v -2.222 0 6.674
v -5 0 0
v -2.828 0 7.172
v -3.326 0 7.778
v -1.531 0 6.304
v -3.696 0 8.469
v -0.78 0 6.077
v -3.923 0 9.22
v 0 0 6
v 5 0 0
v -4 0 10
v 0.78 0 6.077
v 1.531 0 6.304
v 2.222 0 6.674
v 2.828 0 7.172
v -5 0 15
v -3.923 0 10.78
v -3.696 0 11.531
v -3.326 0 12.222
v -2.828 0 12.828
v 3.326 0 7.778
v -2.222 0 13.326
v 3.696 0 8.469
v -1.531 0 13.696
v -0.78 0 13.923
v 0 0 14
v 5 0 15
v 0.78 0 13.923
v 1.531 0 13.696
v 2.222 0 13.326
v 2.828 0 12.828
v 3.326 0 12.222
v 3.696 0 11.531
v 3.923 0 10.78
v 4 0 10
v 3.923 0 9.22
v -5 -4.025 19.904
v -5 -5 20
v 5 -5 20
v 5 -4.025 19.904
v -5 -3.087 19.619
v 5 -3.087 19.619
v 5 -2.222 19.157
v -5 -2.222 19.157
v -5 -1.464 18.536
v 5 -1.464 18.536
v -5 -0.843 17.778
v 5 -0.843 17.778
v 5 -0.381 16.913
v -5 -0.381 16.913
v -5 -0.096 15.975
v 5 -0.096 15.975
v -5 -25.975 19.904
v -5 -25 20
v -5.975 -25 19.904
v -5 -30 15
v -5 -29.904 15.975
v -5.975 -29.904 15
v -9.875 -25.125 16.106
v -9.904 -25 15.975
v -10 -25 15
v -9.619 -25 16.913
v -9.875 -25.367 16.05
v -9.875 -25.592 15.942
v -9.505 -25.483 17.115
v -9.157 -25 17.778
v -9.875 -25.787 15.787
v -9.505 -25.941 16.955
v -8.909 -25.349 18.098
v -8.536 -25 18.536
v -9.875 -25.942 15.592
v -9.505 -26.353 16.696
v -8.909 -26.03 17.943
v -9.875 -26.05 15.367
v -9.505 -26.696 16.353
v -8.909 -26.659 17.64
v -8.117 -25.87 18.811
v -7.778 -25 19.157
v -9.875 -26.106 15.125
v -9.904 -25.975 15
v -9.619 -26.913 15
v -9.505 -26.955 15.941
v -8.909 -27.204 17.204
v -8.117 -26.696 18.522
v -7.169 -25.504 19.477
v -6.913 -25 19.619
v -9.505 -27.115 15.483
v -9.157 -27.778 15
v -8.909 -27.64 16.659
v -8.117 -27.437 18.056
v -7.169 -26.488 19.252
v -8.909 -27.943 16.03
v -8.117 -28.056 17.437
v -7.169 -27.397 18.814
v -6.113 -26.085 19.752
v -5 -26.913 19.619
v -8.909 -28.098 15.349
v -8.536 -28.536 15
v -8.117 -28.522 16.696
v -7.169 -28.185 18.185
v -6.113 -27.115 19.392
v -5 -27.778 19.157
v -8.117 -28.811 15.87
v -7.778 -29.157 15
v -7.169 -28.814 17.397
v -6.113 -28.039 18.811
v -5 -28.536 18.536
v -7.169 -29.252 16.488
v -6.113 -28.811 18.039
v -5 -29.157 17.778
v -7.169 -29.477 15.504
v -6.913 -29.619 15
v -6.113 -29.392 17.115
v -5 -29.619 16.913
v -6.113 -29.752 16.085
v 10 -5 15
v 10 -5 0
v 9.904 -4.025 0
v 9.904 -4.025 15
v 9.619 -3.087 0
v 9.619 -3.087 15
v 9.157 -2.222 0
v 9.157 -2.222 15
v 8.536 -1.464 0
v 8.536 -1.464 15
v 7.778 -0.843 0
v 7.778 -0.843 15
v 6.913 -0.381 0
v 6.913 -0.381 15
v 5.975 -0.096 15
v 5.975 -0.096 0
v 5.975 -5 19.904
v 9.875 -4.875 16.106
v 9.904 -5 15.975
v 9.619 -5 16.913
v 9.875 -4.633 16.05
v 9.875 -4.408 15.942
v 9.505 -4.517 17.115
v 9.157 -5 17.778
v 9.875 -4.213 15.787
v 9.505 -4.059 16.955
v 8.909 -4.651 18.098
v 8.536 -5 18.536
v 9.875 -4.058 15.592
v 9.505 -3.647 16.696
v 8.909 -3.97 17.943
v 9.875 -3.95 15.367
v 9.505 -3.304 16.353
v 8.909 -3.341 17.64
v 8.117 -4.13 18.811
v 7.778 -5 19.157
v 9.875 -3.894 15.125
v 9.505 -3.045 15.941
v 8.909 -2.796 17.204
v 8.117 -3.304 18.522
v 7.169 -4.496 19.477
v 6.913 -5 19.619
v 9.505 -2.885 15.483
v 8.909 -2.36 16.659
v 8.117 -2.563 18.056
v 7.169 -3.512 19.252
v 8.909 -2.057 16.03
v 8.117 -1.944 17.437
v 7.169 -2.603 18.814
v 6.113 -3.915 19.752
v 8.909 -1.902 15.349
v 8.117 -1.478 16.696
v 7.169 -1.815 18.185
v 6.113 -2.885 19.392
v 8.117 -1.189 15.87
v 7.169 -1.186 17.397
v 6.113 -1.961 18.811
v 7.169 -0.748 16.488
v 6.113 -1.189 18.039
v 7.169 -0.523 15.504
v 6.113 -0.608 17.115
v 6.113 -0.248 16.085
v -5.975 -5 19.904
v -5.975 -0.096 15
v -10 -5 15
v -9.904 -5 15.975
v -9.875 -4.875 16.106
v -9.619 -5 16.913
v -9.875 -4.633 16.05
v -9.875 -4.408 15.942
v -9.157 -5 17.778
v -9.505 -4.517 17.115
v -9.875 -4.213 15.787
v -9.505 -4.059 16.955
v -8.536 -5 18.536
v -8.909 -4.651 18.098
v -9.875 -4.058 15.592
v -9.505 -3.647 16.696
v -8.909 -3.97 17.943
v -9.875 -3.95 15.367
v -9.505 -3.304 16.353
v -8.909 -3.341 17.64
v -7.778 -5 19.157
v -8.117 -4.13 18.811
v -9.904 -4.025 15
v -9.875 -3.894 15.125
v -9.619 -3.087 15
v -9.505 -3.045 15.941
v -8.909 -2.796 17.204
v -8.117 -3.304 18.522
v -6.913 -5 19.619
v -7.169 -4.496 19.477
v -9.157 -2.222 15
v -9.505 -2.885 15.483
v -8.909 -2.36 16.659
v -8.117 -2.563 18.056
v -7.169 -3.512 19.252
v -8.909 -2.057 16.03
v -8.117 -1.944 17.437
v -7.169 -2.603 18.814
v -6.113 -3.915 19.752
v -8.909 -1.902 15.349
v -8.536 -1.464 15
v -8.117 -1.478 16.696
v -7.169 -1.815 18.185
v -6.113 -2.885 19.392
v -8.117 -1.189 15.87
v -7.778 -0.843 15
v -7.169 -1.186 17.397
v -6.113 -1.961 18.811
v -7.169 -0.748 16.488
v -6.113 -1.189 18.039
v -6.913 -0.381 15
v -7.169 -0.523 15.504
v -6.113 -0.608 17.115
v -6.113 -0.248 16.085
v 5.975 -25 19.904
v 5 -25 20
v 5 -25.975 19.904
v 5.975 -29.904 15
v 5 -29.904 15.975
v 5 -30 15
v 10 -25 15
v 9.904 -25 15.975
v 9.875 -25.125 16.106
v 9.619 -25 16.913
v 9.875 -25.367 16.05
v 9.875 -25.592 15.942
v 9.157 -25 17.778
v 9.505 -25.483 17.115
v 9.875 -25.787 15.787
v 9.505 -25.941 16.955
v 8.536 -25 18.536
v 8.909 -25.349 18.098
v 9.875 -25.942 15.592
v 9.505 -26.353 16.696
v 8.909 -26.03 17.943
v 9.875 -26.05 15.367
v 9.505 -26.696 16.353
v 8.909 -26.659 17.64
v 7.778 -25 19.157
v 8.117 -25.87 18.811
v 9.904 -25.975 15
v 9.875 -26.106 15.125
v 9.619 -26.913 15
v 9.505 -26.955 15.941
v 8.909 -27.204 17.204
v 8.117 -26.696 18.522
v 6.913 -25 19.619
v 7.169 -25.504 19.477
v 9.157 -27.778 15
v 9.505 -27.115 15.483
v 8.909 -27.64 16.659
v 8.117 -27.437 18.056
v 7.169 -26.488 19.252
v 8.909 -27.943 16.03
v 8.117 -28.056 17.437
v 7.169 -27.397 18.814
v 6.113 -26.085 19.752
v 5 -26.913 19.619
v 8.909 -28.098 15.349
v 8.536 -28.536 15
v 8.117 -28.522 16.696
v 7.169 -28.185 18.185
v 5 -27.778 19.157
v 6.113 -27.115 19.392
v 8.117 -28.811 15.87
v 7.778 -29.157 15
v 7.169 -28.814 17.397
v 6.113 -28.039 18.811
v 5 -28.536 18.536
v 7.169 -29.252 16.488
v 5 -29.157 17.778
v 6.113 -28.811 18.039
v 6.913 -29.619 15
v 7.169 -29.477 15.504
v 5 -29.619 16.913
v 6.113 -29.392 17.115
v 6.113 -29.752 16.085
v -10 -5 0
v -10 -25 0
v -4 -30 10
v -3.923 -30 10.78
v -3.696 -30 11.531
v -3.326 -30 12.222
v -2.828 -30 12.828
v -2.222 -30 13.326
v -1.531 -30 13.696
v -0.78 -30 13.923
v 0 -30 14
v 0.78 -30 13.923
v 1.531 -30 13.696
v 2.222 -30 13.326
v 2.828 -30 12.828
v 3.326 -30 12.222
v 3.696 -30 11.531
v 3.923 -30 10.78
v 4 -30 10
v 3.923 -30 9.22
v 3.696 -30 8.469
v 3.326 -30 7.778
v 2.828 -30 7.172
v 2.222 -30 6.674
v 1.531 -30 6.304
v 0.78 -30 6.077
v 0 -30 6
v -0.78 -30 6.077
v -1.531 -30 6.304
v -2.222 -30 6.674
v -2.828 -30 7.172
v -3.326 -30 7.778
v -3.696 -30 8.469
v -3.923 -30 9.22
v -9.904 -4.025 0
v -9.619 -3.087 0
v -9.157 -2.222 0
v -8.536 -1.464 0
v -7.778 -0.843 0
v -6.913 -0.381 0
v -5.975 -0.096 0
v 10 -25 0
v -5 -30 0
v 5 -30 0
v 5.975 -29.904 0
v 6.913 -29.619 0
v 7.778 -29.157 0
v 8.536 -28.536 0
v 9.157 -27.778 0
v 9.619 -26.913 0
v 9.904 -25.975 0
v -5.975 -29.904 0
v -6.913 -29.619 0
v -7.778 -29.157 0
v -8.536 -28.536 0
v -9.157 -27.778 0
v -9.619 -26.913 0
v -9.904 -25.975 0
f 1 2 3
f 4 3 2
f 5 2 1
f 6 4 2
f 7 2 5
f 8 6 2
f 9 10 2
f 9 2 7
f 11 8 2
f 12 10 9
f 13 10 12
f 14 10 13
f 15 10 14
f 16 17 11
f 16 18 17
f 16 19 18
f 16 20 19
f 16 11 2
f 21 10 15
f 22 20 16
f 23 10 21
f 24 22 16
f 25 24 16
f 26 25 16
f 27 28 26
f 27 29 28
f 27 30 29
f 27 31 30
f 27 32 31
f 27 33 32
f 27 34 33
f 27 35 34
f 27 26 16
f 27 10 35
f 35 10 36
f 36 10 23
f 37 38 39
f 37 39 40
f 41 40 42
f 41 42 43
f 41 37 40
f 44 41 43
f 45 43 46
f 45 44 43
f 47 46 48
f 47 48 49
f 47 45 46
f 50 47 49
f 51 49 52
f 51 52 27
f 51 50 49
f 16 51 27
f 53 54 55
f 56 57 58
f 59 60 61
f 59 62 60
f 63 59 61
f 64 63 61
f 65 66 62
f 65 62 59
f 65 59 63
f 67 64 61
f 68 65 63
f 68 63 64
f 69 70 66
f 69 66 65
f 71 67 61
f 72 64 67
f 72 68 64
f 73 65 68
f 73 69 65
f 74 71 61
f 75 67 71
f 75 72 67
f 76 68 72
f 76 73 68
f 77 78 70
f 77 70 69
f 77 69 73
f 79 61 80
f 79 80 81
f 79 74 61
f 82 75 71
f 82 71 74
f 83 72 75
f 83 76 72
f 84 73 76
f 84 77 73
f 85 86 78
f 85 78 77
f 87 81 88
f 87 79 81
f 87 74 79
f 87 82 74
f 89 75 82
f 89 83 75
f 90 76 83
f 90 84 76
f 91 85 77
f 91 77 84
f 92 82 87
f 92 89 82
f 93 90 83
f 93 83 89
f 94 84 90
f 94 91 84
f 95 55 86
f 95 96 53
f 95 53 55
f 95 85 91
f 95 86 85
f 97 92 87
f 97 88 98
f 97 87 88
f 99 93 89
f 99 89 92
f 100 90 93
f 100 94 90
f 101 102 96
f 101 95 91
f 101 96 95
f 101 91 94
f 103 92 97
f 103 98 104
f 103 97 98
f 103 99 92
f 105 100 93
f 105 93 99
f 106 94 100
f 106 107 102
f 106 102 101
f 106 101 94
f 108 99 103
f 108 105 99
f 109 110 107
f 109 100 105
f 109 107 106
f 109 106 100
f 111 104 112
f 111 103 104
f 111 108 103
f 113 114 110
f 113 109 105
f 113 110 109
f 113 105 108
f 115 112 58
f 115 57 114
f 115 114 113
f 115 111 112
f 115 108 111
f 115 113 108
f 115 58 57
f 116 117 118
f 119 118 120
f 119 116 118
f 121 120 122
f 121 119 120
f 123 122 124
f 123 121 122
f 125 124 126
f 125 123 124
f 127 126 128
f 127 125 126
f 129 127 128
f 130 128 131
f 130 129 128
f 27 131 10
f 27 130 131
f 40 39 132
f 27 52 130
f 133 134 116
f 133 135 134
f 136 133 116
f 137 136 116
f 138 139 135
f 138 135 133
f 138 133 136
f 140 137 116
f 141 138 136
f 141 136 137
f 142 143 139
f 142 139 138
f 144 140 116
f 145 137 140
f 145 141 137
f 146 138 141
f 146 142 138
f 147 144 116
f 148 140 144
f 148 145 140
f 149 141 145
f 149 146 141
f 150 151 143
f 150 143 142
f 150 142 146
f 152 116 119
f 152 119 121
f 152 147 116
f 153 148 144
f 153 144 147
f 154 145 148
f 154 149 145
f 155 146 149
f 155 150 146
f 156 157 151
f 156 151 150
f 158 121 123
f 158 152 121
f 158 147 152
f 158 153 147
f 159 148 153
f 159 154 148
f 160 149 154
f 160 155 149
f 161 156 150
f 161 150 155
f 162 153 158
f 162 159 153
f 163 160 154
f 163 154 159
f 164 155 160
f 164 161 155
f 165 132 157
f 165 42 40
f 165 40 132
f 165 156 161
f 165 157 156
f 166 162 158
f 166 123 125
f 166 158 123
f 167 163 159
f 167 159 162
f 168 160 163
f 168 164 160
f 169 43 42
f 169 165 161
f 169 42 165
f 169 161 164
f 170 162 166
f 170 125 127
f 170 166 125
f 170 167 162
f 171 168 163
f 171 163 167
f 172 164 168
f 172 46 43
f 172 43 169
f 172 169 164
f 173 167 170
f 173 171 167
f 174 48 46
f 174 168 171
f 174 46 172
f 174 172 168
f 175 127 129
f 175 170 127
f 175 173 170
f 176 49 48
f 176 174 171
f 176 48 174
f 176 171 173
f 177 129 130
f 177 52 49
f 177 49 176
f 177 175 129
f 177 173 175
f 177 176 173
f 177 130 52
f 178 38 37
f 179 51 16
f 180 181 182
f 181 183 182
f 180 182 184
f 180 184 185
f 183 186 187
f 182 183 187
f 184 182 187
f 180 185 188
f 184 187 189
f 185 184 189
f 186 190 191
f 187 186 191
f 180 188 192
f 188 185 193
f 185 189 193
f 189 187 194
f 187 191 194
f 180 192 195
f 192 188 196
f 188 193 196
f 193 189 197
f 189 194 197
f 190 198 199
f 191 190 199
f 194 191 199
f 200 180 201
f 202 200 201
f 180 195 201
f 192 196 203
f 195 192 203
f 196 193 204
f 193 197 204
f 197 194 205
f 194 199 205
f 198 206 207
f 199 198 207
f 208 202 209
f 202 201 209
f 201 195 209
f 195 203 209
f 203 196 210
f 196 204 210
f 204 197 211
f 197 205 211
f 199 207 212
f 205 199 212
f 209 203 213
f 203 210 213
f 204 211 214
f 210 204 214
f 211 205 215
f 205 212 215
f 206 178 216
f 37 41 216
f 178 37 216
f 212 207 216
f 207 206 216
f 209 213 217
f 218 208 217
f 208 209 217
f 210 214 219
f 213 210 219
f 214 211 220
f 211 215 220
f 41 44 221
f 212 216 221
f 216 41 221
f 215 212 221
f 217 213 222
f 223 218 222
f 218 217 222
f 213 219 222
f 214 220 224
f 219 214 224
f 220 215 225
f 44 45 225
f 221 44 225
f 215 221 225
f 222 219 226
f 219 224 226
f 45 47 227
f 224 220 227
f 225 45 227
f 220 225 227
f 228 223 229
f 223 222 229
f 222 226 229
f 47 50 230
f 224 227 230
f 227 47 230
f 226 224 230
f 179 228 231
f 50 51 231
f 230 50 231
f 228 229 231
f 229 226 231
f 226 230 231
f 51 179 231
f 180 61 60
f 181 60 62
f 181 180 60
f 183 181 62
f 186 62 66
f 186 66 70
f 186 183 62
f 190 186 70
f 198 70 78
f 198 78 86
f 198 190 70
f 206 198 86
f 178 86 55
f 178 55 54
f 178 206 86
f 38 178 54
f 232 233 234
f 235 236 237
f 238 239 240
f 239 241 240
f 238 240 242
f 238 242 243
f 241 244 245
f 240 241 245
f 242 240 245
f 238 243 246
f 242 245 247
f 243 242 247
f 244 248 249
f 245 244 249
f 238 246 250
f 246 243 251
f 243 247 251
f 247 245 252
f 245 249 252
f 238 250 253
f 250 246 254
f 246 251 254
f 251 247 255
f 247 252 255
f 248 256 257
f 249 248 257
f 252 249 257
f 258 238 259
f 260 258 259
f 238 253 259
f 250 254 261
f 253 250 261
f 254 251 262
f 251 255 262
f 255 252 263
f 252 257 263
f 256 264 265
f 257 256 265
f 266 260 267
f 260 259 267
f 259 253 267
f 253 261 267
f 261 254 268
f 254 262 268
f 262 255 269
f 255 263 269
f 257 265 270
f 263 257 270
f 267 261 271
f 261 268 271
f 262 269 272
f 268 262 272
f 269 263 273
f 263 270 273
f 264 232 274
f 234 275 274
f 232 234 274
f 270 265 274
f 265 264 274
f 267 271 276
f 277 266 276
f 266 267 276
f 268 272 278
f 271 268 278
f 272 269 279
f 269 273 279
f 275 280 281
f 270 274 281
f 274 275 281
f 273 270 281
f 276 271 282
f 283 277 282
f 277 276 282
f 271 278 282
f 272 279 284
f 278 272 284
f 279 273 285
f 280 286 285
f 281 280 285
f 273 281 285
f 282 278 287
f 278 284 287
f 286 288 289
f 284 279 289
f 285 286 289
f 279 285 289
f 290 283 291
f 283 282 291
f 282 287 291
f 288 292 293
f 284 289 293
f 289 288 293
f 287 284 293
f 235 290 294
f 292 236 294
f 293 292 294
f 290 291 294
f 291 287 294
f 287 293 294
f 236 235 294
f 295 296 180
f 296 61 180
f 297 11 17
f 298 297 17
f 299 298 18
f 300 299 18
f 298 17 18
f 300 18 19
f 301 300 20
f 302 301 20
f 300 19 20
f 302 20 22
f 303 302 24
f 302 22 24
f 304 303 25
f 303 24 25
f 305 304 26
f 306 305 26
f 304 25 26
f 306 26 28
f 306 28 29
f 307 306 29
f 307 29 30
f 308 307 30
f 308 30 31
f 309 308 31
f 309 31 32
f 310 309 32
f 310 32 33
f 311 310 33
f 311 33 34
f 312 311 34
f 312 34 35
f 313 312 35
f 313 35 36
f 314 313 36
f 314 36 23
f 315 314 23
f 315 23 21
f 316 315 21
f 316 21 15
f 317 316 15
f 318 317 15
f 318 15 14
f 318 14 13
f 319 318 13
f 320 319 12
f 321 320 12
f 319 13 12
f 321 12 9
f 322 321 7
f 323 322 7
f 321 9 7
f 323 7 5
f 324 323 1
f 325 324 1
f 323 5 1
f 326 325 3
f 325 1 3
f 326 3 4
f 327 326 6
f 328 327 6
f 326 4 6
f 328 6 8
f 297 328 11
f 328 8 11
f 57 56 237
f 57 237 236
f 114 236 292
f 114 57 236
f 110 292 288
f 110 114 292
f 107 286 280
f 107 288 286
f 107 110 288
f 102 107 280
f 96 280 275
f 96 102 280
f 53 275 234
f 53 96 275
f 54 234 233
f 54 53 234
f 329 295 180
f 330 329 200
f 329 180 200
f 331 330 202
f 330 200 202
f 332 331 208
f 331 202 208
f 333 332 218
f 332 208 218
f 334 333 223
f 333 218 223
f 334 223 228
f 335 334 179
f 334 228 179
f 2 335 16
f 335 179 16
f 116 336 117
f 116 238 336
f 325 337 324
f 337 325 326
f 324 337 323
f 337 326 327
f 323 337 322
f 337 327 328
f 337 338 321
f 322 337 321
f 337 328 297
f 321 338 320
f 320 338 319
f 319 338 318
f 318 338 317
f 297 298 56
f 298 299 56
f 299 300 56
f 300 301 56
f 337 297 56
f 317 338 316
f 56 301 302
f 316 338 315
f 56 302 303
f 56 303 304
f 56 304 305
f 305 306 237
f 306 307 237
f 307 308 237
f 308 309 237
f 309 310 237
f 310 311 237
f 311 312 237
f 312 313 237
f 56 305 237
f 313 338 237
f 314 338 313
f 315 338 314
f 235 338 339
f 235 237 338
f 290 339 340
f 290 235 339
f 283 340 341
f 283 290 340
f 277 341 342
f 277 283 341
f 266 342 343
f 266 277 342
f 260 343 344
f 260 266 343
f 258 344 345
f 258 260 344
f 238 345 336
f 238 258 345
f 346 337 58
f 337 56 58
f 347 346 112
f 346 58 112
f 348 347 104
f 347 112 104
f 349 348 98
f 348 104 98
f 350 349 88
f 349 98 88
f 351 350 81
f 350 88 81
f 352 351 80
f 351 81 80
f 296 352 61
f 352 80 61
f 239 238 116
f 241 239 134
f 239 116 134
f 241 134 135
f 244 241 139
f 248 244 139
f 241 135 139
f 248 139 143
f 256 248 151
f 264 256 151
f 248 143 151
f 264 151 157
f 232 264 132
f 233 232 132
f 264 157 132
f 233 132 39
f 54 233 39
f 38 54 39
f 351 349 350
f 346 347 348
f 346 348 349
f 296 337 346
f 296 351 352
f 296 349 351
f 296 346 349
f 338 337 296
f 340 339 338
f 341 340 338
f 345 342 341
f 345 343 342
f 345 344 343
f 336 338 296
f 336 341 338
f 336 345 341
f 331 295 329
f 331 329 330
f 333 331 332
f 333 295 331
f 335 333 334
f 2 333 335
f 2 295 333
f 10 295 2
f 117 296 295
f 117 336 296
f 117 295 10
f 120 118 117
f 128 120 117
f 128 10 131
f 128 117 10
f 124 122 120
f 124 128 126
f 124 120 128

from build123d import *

# Parameters (mm, degrees)
F0_W     = 30
F0_H     = 20
F1_DEPTH = 10
F3_D     = 8
F3_DEPTH = 50
F4_R     = 5


with BuildPart() as f1:
    # F0 (on Right) → F1 (new body, symmetric)
    with BuildSketch(Plane.YZ):
        with Locations((-15, 10)):
            Rectangle(F0_W, F0_H)
    extrude(amount=F1_DEPTH, both=True)

    # F3
    with Locations(Plane.XZ.offset(30)):
        with Locations((0, 10)):
            Hole(F3_D / 2, depth=F3_DEPTH)

    # F4
    f4_edges = [f1.edges().sort_by_distance(p)[0] for p in [
        (0, 0, 20),
        (0, -30, 20),
        (-10, -15, 20),
        (10, -15, 20),
        (10, -30, 10),
        (-10, -30, 10),
        (10, 0, 10),
        (-10, 0, 10),
    ]]
    fillet(f4_edges, radius=F4_R)


solid = f1.part
